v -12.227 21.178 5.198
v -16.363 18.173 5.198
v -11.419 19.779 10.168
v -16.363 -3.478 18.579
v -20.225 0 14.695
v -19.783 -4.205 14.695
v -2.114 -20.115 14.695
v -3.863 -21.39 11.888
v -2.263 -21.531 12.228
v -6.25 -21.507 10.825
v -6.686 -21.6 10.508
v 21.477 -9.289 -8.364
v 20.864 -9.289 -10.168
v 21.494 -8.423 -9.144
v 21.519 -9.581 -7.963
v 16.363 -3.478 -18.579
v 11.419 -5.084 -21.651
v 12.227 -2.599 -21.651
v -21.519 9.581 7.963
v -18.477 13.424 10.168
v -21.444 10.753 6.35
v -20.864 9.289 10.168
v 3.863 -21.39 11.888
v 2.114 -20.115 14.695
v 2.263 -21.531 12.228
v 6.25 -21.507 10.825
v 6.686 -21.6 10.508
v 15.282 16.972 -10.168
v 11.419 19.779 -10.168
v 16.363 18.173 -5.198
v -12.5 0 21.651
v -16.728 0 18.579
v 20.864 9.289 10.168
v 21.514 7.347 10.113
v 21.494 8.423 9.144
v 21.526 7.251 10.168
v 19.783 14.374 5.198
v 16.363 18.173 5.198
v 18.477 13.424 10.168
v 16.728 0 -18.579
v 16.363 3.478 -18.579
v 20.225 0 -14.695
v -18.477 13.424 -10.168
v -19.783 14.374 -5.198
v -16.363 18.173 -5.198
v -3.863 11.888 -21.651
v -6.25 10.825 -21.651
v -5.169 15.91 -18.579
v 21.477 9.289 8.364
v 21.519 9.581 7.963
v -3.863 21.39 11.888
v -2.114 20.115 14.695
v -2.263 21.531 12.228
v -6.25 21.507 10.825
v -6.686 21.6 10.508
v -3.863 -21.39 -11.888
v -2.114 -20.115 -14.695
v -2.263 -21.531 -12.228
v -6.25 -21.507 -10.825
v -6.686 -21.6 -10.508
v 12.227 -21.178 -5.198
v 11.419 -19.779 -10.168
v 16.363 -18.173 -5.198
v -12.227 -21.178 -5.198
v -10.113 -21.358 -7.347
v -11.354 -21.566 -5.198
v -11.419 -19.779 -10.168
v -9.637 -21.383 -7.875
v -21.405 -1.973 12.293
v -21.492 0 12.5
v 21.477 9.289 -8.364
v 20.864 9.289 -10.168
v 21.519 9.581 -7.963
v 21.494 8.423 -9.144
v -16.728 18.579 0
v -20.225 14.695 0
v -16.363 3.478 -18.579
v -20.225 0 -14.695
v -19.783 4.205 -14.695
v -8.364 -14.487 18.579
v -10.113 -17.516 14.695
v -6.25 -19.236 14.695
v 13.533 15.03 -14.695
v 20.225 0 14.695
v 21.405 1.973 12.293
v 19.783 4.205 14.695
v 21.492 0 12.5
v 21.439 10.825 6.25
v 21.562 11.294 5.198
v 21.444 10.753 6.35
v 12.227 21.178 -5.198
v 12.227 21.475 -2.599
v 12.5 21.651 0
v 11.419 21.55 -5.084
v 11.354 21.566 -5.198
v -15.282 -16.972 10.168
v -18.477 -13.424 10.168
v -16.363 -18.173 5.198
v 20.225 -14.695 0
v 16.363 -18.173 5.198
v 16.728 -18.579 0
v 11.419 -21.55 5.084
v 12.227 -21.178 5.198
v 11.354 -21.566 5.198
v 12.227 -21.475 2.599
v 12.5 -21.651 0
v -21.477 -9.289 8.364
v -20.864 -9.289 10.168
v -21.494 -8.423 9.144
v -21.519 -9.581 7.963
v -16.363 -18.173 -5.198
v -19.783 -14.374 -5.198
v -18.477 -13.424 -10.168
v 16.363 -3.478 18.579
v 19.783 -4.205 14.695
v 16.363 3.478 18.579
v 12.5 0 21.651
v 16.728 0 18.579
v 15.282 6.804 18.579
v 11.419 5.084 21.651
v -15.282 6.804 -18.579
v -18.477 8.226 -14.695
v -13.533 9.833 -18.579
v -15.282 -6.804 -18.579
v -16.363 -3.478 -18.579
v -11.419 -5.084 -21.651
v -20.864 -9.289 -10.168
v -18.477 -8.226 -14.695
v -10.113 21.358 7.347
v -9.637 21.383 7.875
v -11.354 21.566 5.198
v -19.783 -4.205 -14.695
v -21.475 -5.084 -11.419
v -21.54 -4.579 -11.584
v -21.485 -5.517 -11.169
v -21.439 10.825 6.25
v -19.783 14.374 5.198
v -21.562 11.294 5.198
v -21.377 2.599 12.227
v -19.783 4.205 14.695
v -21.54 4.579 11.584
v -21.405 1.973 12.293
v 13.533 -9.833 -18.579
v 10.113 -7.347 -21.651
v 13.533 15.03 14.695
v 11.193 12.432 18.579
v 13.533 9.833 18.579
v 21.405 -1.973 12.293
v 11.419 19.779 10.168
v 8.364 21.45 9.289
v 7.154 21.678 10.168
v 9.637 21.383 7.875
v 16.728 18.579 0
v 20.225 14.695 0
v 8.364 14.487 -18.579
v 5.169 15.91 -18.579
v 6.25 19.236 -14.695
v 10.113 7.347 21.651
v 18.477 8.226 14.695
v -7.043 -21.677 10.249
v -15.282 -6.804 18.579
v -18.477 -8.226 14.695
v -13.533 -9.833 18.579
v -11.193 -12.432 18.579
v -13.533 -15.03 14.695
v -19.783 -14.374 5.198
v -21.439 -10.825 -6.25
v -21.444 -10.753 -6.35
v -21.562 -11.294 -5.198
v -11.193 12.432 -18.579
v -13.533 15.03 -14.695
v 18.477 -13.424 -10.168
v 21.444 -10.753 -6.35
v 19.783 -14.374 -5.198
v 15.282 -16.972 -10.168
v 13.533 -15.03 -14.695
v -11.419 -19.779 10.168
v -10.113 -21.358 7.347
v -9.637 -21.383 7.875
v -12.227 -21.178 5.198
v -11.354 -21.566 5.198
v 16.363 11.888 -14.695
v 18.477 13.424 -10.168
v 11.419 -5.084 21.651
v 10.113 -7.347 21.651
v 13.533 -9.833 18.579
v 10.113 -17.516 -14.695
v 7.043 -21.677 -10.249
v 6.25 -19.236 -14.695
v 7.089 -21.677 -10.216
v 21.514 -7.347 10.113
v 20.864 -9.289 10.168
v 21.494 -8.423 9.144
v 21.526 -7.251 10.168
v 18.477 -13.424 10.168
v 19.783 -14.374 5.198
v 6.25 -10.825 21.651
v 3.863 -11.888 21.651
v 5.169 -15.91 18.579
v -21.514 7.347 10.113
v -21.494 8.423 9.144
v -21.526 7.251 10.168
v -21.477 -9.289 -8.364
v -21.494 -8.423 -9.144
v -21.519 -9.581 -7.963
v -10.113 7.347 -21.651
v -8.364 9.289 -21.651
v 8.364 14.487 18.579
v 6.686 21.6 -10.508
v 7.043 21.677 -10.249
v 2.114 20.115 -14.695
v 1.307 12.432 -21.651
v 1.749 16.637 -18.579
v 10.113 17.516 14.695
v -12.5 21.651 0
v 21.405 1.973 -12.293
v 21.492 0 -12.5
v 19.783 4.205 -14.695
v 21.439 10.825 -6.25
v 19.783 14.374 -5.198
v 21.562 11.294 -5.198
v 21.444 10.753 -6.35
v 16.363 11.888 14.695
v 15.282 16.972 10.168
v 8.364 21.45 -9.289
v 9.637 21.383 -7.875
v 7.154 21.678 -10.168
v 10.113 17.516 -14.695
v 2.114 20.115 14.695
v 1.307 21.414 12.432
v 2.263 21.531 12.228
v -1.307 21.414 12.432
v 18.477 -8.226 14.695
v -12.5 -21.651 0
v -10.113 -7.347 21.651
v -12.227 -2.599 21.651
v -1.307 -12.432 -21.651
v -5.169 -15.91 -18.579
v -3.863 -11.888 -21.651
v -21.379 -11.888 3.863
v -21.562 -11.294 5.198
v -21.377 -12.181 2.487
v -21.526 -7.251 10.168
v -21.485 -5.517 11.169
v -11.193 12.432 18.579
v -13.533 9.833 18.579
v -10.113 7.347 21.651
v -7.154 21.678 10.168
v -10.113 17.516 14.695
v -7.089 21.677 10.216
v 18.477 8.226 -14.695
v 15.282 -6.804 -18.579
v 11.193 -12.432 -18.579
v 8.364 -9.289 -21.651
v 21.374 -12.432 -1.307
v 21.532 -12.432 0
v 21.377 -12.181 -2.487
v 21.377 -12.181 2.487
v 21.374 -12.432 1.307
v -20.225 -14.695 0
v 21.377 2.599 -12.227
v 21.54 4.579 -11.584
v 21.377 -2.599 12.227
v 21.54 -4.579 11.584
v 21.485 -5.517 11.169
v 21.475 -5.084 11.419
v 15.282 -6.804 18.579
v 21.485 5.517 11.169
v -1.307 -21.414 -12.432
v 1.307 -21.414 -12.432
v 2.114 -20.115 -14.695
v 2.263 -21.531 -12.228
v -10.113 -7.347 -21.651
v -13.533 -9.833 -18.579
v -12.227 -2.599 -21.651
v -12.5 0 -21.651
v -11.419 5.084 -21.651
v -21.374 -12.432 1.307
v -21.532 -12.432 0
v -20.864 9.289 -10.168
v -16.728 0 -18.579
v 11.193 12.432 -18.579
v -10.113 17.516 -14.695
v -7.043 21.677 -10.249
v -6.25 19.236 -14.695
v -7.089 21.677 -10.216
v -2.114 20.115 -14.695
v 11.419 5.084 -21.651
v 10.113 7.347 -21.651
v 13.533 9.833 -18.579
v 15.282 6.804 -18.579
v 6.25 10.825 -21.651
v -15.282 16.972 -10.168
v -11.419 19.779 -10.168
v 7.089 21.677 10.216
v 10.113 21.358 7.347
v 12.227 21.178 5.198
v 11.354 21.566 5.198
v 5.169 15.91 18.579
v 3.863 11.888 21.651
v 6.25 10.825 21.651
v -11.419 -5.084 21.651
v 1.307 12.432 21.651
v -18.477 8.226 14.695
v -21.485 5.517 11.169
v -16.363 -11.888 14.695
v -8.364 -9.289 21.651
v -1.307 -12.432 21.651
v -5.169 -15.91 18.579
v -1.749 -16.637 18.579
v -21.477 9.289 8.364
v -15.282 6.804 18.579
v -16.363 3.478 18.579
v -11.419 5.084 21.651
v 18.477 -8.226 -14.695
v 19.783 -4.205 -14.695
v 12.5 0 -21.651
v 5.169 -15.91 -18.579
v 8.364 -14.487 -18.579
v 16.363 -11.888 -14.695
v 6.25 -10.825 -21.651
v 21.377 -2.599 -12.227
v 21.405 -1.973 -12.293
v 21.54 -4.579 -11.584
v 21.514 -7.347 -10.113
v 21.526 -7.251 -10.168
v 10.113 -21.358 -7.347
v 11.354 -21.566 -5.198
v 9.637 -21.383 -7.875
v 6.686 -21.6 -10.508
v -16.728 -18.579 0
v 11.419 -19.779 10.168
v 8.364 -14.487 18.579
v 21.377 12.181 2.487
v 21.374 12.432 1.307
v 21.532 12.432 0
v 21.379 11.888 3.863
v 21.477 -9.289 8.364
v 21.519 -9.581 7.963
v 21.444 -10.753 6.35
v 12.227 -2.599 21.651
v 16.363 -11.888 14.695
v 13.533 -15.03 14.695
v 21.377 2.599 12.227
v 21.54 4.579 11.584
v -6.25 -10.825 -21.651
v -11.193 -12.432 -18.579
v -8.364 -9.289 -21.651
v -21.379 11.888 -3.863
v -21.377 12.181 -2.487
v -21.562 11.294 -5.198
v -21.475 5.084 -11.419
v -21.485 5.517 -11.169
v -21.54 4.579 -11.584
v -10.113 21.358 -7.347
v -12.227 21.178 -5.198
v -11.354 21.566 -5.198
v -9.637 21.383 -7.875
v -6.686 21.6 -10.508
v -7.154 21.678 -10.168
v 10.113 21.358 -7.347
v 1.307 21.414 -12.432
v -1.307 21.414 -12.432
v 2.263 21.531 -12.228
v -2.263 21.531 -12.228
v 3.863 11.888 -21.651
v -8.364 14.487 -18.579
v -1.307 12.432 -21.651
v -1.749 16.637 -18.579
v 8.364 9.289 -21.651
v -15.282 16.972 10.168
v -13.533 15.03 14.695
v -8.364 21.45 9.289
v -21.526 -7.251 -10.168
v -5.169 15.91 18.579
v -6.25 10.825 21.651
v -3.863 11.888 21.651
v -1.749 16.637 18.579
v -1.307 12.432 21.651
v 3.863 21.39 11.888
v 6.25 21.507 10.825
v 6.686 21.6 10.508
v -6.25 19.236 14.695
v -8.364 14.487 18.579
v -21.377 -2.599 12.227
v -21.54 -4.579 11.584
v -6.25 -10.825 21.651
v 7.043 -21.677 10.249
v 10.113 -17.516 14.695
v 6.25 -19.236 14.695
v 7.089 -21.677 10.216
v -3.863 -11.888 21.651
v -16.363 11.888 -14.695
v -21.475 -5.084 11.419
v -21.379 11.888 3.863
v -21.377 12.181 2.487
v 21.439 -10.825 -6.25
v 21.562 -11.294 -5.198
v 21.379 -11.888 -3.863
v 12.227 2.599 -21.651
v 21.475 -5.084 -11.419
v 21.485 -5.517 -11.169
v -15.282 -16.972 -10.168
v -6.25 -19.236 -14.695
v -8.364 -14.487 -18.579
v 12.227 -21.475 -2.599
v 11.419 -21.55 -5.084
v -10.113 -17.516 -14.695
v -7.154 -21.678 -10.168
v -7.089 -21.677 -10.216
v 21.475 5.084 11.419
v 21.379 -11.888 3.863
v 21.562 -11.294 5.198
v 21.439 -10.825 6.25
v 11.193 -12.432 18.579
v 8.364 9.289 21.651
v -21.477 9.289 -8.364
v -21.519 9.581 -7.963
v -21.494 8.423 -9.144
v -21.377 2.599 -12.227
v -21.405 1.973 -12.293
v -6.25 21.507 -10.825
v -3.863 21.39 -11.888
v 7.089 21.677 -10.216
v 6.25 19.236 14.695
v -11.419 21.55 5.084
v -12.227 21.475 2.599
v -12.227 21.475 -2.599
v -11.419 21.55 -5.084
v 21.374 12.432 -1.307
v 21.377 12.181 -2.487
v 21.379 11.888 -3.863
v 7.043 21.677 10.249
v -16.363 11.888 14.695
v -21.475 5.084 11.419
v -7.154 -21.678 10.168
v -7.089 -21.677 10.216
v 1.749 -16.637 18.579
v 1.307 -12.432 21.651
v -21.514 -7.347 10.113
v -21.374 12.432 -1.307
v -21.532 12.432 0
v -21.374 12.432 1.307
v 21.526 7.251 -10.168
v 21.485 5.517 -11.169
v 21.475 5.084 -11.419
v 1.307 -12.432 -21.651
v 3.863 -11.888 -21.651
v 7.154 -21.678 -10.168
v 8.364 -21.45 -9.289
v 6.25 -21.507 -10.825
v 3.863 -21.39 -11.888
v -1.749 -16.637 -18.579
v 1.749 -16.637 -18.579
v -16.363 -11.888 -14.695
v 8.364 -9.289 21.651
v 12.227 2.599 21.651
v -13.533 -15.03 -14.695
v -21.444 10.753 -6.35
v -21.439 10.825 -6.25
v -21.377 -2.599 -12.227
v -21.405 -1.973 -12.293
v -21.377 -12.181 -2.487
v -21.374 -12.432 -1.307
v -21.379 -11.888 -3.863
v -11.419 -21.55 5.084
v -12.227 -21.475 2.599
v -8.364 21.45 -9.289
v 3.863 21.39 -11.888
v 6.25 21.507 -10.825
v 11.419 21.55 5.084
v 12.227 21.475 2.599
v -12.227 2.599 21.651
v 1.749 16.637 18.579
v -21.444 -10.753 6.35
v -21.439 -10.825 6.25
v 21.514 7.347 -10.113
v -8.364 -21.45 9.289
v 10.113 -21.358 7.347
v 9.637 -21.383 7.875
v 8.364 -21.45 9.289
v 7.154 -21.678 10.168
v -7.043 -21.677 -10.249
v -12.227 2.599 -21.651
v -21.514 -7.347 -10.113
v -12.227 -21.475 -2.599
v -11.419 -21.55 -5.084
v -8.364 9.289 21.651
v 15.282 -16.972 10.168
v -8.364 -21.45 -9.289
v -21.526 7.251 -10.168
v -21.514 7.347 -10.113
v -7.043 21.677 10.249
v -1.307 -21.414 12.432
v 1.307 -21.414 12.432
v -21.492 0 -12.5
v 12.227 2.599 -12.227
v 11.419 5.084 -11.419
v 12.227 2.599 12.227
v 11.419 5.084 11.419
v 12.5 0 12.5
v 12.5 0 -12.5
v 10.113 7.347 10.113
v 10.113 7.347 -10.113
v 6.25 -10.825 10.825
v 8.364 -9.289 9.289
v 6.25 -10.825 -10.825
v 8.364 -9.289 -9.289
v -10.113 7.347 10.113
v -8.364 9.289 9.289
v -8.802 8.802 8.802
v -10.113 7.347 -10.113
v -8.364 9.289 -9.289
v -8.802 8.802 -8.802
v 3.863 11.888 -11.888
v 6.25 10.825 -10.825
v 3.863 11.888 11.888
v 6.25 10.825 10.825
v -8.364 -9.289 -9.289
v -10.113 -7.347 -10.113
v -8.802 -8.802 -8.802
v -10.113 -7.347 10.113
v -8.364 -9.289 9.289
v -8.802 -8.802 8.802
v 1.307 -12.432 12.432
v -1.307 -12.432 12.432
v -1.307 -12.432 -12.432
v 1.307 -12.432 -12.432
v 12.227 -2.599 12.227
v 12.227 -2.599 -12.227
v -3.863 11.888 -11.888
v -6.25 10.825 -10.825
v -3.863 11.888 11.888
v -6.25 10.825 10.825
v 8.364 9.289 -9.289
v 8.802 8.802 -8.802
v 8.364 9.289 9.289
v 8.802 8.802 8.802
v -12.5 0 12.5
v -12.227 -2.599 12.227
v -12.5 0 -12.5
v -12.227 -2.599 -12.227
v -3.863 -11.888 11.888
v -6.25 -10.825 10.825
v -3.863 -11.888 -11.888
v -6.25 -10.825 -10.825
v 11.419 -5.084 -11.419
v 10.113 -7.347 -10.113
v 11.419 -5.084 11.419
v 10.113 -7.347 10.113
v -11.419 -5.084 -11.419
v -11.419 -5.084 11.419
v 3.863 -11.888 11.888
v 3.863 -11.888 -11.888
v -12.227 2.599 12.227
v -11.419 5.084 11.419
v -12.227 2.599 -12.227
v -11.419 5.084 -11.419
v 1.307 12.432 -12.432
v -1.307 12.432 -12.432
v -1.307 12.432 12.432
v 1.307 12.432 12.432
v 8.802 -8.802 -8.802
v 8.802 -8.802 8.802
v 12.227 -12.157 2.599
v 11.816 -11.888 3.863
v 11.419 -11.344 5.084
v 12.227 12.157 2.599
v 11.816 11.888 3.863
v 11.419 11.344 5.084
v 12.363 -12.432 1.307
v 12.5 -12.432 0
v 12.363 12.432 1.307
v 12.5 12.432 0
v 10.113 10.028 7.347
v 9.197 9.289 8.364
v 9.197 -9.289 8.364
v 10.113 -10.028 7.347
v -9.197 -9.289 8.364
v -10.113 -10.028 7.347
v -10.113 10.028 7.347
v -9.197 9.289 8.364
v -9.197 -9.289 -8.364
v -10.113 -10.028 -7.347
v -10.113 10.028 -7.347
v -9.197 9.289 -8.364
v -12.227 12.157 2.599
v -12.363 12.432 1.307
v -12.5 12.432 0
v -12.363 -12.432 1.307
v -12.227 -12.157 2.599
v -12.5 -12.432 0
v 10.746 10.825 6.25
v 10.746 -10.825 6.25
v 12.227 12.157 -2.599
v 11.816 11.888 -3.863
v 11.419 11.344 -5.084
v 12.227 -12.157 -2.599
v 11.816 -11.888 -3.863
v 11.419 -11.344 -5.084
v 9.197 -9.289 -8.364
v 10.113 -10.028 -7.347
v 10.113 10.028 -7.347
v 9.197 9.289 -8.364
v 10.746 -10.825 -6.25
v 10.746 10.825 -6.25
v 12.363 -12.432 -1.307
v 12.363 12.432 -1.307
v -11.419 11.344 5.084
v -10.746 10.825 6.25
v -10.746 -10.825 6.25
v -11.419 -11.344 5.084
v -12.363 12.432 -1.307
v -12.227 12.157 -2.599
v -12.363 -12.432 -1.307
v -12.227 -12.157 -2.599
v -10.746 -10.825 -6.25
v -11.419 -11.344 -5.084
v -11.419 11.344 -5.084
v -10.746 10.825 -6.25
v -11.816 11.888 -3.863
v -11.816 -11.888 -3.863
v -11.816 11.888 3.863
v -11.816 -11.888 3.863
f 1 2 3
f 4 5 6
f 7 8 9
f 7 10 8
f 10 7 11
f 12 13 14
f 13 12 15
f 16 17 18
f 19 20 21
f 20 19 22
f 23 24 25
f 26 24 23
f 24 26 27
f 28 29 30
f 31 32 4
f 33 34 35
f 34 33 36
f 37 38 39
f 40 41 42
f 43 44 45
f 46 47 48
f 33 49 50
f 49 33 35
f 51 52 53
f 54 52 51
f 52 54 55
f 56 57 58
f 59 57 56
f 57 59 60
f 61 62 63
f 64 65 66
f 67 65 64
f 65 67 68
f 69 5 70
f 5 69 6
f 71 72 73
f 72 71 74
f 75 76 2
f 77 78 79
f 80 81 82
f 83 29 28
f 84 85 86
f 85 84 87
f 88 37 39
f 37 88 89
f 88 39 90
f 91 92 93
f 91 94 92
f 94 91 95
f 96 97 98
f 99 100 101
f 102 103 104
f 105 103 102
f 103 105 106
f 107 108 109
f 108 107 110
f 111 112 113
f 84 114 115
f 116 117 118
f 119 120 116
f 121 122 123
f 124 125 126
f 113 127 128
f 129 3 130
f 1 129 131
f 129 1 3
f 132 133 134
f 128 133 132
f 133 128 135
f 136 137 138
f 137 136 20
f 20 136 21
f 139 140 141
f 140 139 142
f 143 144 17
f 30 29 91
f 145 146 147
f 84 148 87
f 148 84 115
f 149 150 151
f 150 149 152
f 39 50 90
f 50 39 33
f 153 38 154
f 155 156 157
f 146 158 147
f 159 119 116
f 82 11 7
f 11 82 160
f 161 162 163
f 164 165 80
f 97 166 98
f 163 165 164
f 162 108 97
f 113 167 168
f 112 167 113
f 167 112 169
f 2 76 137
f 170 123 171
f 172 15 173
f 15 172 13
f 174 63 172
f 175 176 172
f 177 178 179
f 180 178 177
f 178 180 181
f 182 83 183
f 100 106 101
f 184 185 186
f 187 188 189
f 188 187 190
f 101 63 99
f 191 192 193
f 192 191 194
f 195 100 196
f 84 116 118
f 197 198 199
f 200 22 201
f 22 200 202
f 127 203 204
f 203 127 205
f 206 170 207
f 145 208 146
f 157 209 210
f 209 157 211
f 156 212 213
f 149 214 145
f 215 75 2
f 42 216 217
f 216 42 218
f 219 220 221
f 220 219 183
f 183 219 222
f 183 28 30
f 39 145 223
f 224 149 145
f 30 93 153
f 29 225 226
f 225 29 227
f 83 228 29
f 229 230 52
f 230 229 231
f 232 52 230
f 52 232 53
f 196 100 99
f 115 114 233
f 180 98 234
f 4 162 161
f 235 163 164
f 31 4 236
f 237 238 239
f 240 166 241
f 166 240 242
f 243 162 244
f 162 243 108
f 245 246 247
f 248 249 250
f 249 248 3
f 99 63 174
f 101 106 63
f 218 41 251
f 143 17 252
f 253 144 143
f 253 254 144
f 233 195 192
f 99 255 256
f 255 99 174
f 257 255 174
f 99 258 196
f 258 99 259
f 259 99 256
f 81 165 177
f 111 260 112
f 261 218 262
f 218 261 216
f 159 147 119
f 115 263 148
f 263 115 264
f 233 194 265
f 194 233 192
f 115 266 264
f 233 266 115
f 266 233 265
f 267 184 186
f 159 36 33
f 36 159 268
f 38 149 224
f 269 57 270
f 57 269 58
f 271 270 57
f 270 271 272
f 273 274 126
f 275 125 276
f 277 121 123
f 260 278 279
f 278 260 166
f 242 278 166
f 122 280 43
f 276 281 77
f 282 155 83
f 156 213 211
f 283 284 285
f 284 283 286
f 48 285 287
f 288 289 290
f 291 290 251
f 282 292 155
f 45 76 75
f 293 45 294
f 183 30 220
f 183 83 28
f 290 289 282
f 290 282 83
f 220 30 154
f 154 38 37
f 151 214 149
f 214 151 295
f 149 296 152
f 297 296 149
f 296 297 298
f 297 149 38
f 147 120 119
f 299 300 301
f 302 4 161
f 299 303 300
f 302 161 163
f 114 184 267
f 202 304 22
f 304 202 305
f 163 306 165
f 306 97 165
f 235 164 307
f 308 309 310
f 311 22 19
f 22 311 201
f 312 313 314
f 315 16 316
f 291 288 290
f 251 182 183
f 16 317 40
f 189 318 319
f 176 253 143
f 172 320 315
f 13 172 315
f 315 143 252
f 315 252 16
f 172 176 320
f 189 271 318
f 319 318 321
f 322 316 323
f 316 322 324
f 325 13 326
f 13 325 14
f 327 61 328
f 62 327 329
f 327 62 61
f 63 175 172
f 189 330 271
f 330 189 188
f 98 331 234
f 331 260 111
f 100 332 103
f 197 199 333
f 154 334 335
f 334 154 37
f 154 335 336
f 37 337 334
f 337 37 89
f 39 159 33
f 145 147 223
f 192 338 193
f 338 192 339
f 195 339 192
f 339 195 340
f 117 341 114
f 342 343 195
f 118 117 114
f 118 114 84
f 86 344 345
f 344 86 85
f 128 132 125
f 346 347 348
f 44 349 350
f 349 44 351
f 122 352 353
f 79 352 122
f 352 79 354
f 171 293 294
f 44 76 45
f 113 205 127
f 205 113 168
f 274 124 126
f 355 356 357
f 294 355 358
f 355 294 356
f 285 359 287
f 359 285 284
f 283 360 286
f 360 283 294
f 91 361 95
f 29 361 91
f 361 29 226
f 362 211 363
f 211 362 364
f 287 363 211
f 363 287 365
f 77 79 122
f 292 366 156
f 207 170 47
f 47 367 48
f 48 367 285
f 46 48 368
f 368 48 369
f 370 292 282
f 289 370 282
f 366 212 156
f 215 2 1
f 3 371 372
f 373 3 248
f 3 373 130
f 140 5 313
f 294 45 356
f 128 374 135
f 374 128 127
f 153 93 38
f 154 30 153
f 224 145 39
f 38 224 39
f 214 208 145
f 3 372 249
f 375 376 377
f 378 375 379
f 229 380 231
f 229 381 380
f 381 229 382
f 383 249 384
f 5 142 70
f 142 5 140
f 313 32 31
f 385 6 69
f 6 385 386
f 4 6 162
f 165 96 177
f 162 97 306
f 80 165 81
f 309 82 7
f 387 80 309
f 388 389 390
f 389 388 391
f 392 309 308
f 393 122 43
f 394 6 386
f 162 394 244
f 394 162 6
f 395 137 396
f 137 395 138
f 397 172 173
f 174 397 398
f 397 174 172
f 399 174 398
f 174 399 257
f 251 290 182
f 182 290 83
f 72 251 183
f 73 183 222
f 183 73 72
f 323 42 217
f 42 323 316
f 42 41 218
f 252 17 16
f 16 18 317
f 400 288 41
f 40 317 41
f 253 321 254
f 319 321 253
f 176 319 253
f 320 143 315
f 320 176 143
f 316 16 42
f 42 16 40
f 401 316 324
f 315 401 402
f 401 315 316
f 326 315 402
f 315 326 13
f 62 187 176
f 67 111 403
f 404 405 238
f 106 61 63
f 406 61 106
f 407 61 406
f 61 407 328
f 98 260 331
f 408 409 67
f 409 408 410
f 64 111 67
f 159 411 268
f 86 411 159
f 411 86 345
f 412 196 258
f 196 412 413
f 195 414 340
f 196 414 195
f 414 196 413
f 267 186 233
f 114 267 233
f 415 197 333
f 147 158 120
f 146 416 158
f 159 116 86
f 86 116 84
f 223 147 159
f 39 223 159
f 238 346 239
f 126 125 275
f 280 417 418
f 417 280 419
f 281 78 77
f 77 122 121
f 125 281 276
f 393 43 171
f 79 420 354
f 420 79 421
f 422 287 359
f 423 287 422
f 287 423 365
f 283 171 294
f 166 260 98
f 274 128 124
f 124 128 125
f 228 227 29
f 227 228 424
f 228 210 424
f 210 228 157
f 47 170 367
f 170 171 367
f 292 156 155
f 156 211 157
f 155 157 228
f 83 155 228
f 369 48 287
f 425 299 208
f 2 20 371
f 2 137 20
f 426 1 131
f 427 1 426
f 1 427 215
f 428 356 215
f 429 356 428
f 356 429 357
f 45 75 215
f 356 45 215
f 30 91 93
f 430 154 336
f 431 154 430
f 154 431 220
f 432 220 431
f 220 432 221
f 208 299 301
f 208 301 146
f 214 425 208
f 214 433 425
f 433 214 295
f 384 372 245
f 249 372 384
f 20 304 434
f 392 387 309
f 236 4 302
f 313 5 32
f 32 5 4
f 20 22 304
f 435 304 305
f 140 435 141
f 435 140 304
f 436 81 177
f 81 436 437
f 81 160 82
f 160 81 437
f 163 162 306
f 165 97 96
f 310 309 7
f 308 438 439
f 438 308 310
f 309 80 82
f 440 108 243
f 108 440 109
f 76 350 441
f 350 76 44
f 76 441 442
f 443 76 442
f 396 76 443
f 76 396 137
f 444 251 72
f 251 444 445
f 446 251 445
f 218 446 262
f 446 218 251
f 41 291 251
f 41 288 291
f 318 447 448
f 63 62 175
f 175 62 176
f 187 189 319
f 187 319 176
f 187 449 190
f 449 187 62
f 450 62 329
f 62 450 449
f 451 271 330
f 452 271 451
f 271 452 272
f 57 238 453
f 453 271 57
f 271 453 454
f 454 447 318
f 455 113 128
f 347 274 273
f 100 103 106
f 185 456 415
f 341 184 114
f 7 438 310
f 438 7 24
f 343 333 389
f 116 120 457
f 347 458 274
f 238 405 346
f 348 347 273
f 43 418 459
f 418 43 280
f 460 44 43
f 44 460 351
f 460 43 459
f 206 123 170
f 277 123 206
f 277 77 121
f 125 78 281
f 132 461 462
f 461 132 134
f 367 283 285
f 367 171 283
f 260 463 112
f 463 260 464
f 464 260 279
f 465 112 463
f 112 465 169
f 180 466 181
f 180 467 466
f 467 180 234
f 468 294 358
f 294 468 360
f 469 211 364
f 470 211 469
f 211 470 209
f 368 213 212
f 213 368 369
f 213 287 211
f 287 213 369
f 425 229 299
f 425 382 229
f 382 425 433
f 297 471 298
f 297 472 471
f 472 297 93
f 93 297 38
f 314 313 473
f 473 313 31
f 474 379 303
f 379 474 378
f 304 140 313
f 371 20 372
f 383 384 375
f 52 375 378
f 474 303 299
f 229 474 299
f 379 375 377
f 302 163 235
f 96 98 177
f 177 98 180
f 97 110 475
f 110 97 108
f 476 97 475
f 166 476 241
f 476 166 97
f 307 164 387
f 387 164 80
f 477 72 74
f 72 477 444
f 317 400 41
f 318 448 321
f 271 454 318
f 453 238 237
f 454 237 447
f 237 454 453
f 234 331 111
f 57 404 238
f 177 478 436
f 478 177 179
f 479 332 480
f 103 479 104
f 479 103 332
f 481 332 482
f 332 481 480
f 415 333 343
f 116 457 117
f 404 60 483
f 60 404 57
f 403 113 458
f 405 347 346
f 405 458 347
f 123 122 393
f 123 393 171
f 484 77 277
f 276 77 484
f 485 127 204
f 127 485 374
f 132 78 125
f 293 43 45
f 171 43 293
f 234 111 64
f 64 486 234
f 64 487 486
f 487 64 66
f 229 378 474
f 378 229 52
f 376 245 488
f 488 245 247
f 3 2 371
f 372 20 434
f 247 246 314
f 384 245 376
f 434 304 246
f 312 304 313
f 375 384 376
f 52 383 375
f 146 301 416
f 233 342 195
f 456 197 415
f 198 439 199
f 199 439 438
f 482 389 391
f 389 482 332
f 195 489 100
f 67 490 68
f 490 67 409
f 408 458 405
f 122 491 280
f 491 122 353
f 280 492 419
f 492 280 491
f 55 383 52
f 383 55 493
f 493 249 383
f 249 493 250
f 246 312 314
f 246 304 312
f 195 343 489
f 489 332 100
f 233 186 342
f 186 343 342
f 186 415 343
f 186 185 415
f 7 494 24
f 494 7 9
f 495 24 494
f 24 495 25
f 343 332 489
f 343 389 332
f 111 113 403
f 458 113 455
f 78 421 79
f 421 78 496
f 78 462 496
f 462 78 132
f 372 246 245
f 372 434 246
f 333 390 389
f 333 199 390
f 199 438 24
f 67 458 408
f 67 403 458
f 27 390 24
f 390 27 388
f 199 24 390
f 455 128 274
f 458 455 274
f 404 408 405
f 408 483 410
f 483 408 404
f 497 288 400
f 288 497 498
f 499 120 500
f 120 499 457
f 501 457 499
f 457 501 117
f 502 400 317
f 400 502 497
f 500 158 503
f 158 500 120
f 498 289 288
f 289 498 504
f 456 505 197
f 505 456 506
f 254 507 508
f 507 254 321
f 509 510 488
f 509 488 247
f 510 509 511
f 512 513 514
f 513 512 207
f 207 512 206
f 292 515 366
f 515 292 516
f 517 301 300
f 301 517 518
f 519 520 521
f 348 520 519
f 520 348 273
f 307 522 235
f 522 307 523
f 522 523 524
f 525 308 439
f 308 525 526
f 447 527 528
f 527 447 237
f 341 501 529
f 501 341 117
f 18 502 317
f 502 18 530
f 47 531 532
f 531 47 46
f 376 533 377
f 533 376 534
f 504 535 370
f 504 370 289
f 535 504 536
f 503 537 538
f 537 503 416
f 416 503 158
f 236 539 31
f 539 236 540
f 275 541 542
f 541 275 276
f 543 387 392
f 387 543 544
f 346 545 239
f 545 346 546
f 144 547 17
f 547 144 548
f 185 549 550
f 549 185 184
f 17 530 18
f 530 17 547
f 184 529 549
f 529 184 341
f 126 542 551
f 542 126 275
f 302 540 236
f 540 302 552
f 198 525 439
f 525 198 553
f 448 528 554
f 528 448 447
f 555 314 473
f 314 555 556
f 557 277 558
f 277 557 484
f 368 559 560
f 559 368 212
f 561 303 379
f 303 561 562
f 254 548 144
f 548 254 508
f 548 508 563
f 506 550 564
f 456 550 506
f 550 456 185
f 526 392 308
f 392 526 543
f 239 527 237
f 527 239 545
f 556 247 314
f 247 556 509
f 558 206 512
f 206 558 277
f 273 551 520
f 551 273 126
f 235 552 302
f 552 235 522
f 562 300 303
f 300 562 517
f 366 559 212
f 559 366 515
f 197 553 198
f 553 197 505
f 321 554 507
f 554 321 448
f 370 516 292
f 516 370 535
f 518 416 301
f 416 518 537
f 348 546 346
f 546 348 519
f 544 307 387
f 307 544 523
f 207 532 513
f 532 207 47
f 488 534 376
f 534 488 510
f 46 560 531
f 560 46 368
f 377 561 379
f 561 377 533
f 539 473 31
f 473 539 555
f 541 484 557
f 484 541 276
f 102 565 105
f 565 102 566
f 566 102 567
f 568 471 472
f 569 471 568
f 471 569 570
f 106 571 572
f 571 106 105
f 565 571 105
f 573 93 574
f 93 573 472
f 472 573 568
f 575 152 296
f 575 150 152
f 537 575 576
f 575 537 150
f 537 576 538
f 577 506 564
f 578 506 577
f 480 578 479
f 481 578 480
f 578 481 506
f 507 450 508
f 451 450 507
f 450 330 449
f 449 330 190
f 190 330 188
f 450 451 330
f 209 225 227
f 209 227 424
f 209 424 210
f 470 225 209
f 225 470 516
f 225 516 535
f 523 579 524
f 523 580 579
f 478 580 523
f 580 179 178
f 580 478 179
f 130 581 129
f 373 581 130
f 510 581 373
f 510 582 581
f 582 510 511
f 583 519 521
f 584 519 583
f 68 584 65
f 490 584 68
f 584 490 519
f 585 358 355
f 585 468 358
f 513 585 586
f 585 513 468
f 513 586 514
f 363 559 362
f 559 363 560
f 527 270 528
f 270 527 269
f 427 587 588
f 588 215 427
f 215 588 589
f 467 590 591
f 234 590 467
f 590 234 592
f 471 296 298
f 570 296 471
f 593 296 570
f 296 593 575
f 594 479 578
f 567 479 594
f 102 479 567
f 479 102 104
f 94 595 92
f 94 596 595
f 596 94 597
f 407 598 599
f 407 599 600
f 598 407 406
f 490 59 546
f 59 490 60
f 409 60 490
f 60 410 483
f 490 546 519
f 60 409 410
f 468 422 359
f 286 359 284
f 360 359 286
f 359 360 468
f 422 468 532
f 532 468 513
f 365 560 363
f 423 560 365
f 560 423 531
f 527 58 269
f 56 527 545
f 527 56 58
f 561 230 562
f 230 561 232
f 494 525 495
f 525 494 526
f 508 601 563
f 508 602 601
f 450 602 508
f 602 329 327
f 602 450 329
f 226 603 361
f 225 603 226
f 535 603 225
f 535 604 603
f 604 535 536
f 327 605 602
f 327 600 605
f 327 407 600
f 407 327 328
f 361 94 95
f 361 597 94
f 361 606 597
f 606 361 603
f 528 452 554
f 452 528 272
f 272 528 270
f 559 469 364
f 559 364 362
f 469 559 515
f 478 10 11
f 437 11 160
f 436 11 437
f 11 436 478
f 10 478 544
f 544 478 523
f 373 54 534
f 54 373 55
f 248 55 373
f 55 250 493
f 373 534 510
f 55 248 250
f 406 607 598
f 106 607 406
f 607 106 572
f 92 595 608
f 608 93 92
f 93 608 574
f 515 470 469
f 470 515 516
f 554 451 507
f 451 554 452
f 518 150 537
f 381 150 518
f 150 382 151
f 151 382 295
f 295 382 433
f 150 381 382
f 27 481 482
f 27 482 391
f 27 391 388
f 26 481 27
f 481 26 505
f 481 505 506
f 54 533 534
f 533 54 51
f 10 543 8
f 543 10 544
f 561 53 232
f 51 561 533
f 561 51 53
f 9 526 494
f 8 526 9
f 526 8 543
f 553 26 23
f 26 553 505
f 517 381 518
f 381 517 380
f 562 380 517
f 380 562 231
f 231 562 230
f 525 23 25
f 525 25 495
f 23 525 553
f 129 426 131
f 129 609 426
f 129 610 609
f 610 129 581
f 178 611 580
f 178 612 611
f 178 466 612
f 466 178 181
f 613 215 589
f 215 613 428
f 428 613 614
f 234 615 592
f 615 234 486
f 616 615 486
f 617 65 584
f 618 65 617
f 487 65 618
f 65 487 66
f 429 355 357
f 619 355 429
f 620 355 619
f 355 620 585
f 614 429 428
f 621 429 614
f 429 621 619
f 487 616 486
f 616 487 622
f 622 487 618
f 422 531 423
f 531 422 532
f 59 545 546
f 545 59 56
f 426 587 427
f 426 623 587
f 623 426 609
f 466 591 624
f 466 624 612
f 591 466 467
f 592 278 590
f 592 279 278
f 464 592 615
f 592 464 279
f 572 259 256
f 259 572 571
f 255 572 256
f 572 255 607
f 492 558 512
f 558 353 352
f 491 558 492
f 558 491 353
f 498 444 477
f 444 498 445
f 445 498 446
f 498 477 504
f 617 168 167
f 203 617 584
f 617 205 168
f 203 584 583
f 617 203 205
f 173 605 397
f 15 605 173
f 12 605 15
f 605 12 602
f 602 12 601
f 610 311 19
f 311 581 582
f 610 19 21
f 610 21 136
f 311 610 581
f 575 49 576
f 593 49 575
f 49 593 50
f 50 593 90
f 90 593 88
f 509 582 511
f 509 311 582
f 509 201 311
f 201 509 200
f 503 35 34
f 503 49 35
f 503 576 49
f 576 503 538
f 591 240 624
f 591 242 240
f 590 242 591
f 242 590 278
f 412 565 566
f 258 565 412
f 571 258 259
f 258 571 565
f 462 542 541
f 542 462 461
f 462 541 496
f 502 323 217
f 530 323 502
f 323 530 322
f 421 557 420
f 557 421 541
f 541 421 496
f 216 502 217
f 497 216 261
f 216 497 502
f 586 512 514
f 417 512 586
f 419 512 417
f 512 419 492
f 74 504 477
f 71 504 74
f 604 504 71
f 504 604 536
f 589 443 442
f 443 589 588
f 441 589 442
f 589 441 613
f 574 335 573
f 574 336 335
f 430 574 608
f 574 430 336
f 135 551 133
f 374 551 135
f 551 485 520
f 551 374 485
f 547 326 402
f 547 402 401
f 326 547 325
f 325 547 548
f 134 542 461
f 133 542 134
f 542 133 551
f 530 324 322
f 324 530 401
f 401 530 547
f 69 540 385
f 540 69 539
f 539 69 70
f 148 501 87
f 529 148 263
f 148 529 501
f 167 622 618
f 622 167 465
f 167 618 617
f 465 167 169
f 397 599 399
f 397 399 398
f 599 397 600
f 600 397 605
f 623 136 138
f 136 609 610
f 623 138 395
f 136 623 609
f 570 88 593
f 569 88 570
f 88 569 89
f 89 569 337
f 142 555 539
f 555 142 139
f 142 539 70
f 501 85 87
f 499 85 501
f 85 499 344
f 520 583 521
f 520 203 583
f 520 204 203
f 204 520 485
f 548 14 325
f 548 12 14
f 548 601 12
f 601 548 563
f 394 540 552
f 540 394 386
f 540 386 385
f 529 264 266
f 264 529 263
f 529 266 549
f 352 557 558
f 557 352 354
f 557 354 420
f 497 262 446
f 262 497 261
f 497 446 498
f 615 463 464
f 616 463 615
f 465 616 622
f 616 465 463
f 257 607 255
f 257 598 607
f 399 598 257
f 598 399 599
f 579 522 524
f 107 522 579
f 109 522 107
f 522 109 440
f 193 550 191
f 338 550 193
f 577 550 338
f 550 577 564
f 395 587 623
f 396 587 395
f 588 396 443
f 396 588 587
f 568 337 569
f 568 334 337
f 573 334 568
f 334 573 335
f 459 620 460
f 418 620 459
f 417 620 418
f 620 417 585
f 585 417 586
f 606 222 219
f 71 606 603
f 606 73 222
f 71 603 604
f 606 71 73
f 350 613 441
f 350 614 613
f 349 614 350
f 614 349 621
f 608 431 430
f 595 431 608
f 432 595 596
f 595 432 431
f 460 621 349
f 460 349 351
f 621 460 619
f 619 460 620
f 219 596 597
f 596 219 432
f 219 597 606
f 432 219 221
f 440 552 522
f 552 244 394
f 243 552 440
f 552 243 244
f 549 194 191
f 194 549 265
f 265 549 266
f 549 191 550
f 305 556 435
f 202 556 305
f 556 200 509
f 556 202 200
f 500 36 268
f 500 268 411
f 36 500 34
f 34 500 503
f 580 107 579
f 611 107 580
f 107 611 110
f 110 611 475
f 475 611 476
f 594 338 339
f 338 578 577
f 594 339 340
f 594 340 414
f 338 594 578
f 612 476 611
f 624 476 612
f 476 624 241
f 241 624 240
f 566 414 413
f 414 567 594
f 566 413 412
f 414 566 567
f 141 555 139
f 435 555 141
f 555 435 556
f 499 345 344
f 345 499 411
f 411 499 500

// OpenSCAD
module difference_sphere()
{
	function r_from_dia(d) = d / 2;

	module rotcy(rot, r, h) {
		rotate(90, rot)
			cylinder(r = r, h = h, center = true);
	}

	difference() {
		sphere(r = r_from_dia(size));
		rotcy([0, 0, 0], cy_r, cy_h);
		rotcy([1, 0, 0], cy_r, cy_h);
		rotcy([0, 1, 0], cy_r, cy_h);
	}

	size = 50;
	hole = 25;

	cy_r = r_from_dia(hole);
	cy_h = r_from_dia(size * 2.5);
}

difference_sphere();
